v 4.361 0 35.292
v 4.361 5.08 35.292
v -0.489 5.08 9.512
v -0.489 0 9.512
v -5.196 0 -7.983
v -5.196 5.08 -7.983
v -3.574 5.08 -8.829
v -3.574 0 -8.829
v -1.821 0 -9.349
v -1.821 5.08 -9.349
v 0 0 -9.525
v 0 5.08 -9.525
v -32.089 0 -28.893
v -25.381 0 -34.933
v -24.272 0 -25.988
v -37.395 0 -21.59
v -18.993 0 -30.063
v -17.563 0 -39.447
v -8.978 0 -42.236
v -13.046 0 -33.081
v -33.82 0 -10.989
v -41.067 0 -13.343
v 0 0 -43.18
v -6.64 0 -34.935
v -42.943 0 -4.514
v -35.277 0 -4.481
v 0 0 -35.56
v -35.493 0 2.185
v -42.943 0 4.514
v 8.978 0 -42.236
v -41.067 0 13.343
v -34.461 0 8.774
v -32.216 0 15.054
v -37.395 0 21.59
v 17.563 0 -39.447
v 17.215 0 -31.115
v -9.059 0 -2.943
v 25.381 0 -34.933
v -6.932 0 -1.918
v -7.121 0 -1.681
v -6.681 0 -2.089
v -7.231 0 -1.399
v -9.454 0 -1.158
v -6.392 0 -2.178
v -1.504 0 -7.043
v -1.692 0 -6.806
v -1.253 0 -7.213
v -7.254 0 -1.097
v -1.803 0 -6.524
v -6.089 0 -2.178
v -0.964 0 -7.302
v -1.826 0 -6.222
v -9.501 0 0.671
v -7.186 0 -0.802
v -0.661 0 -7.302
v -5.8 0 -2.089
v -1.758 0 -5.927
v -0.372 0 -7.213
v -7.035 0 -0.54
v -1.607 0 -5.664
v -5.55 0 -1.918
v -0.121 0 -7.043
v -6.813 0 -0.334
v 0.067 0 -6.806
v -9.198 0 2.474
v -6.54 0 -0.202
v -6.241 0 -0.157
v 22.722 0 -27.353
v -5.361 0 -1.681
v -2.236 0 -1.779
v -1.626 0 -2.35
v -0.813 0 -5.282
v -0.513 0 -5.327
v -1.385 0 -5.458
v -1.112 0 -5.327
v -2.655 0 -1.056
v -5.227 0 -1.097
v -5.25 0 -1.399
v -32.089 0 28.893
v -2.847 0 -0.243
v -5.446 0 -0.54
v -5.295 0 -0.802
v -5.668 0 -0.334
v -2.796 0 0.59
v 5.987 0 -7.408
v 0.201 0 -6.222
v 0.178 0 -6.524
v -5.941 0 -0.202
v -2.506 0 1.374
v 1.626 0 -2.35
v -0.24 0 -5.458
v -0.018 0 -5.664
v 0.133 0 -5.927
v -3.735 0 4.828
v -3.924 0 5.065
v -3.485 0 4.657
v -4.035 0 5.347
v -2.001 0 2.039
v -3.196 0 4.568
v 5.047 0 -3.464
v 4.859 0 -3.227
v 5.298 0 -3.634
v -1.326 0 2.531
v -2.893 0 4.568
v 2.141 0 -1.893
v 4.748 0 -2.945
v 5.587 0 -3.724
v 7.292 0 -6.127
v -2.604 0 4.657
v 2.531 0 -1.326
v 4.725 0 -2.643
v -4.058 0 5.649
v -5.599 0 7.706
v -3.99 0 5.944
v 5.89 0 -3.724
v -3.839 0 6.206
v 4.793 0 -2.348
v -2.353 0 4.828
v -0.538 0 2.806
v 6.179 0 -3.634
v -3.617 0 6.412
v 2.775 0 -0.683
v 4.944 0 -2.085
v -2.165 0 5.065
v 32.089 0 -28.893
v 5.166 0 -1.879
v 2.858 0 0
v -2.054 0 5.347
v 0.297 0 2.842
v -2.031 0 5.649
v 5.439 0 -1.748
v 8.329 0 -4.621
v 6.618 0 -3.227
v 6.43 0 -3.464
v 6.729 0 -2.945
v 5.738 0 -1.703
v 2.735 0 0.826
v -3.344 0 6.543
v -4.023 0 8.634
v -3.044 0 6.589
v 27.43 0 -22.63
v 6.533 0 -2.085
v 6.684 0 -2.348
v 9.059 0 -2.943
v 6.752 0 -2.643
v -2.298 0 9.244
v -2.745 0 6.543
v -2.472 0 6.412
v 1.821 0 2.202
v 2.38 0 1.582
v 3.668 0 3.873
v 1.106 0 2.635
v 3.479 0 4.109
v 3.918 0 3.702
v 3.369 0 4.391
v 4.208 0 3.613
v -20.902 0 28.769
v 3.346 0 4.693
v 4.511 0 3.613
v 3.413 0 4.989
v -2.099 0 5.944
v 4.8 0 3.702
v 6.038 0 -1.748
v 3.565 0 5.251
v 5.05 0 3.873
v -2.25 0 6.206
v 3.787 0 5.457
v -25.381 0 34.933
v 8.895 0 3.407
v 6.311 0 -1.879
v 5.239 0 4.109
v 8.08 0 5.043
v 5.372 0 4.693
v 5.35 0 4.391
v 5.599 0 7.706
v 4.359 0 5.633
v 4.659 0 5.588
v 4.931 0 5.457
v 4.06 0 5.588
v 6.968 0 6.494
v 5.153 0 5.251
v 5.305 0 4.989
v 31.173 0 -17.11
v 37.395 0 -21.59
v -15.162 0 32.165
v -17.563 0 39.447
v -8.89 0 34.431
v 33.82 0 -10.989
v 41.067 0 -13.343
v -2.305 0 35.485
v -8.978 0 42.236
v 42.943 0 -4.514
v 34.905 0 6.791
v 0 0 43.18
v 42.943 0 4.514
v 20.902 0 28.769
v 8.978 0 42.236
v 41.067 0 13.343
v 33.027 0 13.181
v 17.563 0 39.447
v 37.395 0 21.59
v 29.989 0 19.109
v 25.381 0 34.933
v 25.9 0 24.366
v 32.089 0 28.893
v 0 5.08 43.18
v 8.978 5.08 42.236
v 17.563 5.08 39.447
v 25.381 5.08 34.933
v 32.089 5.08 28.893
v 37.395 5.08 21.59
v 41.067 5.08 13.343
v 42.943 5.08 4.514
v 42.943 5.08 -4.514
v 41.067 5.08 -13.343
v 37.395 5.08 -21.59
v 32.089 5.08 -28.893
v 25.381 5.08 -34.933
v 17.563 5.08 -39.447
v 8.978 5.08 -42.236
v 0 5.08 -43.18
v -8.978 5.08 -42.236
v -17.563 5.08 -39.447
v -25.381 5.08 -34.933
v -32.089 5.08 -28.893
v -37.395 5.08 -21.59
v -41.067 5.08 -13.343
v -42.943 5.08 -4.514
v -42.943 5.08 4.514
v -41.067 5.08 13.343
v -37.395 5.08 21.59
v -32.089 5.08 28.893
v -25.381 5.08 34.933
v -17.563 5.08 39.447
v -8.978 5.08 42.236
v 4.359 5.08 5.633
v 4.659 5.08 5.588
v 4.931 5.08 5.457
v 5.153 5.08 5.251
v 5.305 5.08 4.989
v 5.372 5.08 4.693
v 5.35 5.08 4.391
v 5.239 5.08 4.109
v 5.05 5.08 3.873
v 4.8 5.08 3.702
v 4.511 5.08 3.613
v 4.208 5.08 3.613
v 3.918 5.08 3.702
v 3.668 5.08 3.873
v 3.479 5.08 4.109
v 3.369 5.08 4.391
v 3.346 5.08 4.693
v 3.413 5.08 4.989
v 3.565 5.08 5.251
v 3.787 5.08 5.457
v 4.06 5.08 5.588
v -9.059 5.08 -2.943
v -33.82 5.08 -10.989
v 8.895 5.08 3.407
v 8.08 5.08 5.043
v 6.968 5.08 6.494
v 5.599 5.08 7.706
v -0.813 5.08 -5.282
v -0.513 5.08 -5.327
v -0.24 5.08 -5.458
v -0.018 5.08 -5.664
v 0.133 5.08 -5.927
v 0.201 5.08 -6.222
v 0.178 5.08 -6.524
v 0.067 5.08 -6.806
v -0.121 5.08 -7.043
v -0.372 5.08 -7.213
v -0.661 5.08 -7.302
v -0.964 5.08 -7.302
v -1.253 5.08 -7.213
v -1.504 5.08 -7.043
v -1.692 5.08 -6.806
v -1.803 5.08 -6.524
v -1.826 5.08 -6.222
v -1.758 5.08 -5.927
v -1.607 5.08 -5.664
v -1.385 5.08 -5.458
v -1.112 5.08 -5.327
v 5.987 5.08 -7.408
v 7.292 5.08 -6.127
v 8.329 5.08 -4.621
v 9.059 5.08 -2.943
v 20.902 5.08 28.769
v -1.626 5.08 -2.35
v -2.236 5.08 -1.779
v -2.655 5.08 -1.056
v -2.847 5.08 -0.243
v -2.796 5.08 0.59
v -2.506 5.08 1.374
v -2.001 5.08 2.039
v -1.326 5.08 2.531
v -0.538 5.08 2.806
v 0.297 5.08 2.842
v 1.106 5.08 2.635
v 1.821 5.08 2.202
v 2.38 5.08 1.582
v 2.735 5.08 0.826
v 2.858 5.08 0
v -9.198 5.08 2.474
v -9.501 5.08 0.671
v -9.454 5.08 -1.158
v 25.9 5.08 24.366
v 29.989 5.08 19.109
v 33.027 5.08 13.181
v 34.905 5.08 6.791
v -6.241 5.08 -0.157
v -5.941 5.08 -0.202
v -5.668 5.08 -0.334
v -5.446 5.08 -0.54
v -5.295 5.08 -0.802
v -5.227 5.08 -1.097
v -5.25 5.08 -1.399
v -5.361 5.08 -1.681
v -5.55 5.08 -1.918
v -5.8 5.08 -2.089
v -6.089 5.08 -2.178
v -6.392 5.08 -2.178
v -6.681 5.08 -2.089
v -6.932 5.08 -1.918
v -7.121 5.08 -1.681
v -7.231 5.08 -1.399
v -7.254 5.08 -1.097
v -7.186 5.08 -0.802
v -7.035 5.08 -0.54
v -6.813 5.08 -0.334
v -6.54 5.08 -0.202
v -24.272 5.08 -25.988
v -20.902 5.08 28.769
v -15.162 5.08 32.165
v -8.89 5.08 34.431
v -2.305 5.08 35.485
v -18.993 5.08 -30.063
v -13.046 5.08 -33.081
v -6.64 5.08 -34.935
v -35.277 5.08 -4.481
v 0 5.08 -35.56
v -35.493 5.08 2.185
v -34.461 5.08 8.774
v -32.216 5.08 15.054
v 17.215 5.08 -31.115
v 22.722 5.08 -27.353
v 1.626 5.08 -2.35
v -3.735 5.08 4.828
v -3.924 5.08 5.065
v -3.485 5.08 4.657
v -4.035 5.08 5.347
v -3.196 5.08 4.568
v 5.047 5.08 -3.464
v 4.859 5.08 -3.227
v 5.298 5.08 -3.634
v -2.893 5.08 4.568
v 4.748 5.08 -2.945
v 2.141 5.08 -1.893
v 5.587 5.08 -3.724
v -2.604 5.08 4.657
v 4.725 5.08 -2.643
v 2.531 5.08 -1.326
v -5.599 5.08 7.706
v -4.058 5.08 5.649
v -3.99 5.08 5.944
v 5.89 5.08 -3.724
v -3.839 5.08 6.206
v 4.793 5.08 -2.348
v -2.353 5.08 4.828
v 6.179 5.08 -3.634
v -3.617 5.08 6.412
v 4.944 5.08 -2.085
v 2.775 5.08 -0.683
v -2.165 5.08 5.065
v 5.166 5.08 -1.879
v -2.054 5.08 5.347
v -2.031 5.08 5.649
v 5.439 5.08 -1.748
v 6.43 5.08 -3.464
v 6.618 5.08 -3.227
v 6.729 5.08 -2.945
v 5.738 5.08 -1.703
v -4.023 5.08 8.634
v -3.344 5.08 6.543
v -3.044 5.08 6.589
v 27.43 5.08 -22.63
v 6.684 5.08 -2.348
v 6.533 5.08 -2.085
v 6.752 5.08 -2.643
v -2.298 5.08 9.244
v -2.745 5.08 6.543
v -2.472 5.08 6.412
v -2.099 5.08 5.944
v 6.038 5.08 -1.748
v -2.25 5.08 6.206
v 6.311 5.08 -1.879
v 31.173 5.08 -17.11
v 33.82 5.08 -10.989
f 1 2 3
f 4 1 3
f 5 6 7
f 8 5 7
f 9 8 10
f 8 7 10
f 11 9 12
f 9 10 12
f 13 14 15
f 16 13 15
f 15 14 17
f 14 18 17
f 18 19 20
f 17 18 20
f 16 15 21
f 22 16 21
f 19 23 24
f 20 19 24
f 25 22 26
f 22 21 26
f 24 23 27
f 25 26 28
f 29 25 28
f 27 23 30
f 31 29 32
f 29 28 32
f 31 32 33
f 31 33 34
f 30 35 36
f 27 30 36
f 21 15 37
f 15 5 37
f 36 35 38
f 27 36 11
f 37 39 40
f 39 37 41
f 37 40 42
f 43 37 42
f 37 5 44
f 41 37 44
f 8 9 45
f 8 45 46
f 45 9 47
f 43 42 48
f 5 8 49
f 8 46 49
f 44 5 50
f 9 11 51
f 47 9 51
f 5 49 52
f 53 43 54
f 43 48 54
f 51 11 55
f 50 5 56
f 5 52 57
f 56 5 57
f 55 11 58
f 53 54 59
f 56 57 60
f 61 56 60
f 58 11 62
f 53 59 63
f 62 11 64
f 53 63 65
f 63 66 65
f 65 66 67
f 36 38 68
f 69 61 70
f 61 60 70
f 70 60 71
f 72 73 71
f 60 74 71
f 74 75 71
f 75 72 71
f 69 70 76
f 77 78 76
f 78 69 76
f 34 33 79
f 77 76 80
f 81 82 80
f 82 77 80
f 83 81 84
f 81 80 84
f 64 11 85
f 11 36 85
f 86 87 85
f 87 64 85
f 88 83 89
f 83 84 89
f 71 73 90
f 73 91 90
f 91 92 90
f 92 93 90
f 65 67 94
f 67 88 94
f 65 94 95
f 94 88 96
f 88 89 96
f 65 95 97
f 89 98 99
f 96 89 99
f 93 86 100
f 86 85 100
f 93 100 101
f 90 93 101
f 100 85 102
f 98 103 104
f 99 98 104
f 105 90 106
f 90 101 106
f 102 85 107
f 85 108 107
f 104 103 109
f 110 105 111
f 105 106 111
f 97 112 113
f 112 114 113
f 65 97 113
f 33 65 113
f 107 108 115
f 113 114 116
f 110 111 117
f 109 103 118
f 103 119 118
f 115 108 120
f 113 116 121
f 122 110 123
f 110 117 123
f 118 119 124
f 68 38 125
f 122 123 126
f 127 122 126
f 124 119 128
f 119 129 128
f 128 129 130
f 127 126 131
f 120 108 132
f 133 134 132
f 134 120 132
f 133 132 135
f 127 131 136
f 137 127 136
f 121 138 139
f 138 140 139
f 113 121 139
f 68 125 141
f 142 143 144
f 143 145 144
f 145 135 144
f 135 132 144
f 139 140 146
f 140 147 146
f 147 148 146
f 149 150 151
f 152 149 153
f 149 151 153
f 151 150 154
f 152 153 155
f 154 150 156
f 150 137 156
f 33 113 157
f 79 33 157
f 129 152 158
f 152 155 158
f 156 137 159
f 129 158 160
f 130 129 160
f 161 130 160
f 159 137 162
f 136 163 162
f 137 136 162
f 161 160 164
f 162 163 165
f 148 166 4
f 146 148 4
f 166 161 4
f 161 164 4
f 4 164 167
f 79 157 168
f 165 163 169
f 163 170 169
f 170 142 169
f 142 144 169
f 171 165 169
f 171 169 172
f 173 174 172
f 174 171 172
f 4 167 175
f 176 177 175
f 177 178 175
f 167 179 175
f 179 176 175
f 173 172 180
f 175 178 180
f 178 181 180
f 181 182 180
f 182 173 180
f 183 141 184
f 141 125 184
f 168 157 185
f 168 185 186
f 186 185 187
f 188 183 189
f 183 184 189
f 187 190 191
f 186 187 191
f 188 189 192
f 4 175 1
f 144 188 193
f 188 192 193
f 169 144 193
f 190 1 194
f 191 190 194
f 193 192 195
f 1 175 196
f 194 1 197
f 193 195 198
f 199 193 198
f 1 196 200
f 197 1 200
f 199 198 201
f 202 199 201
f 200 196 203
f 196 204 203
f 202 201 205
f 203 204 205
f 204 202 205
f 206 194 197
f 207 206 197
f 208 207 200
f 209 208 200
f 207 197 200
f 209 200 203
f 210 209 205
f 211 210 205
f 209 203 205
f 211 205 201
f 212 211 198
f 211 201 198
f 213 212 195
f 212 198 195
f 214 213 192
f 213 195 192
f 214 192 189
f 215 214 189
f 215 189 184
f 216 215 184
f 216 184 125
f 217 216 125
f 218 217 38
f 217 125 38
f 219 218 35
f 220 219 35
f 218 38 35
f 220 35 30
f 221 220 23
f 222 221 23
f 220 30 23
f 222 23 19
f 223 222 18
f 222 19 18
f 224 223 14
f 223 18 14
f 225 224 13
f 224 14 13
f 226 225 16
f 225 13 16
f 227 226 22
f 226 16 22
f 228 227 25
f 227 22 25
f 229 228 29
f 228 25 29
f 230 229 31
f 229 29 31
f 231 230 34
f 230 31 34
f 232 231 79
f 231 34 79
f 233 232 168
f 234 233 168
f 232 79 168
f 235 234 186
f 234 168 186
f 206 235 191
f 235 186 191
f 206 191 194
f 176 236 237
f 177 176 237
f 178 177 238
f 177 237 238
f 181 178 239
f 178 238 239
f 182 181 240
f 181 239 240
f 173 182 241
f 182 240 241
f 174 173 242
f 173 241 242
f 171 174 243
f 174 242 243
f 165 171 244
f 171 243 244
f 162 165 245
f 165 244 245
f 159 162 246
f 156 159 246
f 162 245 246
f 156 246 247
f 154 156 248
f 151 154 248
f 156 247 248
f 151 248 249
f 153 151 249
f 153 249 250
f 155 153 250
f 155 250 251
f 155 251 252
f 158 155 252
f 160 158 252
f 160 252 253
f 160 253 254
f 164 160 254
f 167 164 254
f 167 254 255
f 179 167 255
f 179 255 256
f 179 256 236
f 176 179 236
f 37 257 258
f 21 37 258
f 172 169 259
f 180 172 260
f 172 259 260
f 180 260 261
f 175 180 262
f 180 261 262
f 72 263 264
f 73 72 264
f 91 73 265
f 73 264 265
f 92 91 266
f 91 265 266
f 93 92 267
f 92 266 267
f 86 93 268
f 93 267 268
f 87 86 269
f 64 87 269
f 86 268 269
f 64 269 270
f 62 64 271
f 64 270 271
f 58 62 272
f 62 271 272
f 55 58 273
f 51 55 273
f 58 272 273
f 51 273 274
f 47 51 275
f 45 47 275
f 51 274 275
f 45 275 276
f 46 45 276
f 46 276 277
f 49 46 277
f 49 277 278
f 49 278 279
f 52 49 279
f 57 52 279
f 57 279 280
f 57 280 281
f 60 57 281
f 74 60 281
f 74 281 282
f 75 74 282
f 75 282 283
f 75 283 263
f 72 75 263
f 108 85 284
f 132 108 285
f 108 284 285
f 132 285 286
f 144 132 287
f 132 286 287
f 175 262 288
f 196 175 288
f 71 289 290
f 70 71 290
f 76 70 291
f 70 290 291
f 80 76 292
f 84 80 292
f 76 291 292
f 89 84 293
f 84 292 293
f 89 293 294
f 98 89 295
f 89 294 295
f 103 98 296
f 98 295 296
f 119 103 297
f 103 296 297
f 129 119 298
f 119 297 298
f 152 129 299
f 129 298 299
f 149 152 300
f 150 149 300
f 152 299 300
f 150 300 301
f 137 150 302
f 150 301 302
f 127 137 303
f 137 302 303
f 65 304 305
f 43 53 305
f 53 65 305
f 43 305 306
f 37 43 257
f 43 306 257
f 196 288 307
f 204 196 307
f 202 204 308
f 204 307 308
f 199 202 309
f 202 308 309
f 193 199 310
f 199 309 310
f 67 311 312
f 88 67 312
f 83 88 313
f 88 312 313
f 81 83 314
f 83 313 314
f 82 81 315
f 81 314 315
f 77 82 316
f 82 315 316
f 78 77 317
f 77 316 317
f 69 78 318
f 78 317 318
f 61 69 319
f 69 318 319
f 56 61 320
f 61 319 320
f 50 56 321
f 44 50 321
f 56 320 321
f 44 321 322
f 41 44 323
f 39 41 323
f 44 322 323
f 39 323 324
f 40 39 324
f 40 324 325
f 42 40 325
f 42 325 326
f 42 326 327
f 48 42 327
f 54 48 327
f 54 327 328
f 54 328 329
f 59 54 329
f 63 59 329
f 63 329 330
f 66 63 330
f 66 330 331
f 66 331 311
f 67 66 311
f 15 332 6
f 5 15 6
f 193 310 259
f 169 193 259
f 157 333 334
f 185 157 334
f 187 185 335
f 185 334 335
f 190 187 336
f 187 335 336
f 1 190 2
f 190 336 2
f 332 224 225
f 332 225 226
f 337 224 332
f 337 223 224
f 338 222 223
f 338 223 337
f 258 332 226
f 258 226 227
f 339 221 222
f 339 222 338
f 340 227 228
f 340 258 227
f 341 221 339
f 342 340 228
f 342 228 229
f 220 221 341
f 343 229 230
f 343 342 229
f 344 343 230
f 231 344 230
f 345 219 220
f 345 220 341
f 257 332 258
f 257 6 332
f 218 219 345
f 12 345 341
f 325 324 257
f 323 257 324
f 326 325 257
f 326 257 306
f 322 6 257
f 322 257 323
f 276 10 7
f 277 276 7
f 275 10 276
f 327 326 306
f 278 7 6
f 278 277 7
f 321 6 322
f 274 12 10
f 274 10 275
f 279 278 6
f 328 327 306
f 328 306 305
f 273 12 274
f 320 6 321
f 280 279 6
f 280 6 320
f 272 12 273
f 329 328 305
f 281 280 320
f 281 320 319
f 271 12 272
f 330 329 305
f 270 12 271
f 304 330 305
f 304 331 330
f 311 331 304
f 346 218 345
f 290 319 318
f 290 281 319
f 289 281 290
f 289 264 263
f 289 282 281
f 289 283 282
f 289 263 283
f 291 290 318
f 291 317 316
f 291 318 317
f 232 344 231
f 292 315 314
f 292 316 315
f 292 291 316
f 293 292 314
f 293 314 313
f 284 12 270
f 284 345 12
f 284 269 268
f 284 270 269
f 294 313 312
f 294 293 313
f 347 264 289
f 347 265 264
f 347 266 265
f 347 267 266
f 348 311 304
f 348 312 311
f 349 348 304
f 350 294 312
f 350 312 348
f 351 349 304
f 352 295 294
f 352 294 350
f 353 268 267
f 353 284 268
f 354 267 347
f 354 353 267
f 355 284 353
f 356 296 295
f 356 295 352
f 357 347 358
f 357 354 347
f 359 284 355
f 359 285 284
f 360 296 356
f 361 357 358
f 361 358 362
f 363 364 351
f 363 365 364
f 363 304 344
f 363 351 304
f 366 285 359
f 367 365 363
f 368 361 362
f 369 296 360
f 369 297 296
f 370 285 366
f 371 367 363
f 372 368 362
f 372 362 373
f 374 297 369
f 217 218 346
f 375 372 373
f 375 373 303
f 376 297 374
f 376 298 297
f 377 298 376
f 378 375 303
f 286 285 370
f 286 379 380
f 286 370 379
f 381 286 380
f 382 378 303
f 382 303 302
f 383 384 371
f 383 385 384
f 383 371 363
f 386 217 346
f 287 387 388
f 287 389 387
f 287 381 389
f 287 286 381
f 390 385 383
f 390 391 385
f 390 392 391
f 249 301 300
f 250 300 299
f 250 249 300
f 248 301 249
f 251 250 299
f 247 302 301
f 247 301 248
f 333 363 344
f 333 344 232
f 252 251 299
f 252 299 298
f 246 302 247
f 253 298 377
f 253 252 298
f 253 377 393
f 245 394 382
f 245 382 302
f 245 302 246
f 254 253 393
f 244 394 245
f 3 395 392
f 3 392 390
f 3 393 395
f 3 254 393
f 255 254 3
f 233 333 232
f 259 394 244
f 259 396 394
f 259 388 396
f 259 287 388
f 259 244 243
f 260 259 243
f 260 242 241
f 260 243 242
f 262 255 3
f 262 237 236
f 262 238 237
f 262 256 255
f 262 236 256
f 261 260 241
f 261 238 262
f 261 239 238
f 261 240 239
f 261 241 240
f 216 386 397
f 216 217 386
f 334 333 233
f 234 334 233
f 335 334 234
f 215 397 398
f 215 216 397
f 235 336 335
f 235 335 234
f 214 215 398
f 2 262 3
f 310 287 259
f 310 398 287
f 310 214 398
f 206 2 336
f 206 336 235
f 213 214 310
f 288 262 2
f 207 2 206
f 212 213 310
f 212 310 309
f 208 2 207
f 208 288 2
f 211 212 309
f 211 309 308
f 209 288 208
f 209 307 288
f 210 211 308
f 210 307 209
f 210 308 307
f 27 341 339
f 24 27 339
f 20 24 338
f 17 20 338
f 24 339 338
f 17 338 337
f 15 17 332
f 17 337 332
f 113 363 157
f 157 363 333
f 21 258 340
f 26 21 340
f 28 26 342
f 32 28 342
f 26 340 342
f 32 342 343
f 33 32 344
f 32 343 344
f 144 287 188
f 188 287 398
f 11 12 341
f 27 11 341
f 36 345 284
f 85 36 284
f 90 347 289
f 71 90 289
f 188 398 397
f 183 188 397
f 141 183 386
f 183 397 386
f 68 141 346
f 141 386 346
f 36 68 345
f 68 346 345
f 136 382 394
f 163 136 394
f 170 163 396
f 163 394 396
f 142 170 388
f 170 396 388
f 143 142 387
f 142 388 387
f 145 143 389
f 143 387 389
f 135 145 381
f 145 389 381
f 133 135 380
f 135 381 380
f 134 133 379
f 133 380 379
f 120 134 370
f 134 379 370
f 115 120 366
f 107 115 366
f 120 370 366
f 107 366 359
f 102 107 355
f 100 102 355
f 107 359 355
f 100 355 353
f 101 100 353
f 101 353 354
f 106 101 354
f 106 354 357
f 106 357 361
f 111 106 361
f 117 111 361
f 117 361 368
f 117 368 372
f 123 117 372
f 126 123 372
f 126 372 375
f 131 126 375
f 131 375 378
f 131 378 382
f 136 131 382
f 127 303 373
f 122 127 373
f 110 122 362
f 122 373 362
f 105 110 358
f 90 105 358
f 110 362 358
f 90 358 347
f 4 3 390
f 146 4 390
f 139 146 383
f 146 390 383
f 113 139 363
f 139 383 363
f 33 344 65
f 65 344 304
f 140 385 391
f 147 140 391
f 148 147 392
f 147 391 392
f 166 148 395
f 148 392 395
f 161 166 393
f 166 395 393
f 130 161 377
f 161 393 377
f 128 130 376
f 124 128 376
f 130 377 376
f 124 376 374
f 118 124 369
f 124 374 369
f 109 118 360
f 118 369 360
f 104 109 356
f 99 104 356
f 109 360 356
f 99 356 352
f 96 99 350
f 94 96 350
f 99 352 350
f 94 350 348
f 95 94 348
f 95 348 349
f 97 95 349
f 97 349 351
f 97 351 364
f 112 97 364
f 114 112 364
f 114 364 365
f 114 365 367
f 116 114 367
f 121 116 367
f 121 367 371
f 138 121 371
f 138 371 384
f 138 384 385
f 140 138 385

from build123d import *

# Parameters (mm, degrees)
SKETCH2_R           = 43.18
BOSS_EXTRUDE1_DEPTH = 5.08
CUT_EXTRUDE1_DEPTH  = 62.276677456
CUT_EXTRUDE2_DEPTH  = 62.276677456
SKETCH6_R           = 1.016
CUT_EXTRUDE3_DEPTH  = 62.276677456


with BuildPart() as part:
    # Sketch2 → Boss-Extrude1 (new body)
    with BuildSketch(Plane(origin=(0, 0, 0), x_dir=(1, 0, 0), z_dir=(0, 1, 0))):
        with Locations(Location((0, 0, 0), (0, 0, 270))):
            Circle(SKETCH2_R)
    extrude(amount=BOSS_EXTRUDE1_DEPTH)

    # Sketch3 → Cut-Extrude1 (cut, through all)
    with BuildSketch(Plane(origin=(0, 5.08, 0), x_dir=(1, 0, 0), z_dir=(0, 1, 0))):
        with BuildLine():
            Line((1.626393556, 2.3495), (-1.626393556, 2.3495))
            ThreePointArc((-1.626393556, 2.3495), (-1.326251609, -2.531079398), (2.8575, 0))
            ThreePointArc((2.8575, 0), (2.531079398, 1.326251609), (1.626393556, 2.3495))
        make_face()
    extrude(amount=-CUT_EXTRUDE1_DEPTH, mode=Mode.SUBTRACT)

    # Sketch5 → Cut-Extrude2 (cut, through all)
    with BuildSketch(Plane(origin=(0, 5.08, 0), x_dir=(1, 0, 0), z_dir=(0, 1, 0))):
        with BuildLine():
            Line((-9.058813318, 2.943386871), (-33.819569719, 10.98864432))
            ThreePointArc((-33.819569719, 10.98864432), (-35.492818655, -2.184816682), (-32.216498168, -15.053599097))
            Line((-32.216498168, -15.053599097), (-9.197962288, -2.474492827))
            ThreePointArc((-9.197962288, -2.474492827), (-9.521860059, 0.244552684), (-9.058813318, 2.943386871))
        make_face()
        with BuildLine():
            Line((-5.598654528, -7.705886871), (-20.901643572, -28.76864432))
            ThreePointArc((-20.901643572, -28.76864432), (-8.89, -34.430821948), (4.361378082, -35.291528463))
            Line((4.361378082, -35.291528463), (-0.488944133, -9.512442307))
            ThreePointArc((-0.488944133, -9.512442307), (-3.175, -8.980256121), (-5.598654528, -7.705886871))
        make_face()
        with BuildLine():
            Line((5.598654528, -7.705886871), (20.901643572, -28.76864432))
            ThreePointArc((20.901643572, -28.76864432), (29.9893062, -19.109032253), (34.905459287, -6.79135568))
            Line((34.905459287, -6.79135568), (8.894976784, -3.406613129))
            ThreePointArc((8.894976784, -3.406613129), (7.558920282, -5.795545631), (5.598654528, -7.705886871))
        make_face()
        with BuildLine():
            ThreePointArc((33.819569719, 10.98864432), (27.430090445, 22.629709193), (17.215410974, 31.115))
            Line((17.215410974, 31.115), (5.986837414, 7.408333333))
            ThreePointArc((5.986837414, 7.408333333), (7.847091067, 5.39896164), (9.058813318, 2.943386871))
            Line((9.058813318, 2.943386871), (33.819569719, 10.98864432))
        make_face()
        with BuildLine():
            ThreePointArc((0, 35.56), (-13.045768285, 33.080530979), (-24.272268948, 25.987892567))
            Line((-24.272268948, 25.987892567), (-5.195709188, 7.983121635))
            ThreePointArc((-5.195709188, 7.983121635), (-2.709833153, 9.131397992), (0, 9.525))
            Line((0, 9.525), (0, 35.56))
        make_face()
    extrude(amount=-CUT_EXTRUDE2_DEPTH, mode=Mode.SUBTRACT)

    # Sketch6 → Cut-Extrude3 (cut, through all)
    with BuildSketch(Plane(origin=(0, 5.08, 0), x_dir=(1, 0, 0), z_dir=(0, 1, 0))):
        with Locations(Location((5.738468444, 2.718911532, 0), (0, 0, 270))):
            Circle(SKETCH6_R)
        with Locations(Location((4.3591228, -4.617417938, 0), (0, 0, 270))):
            Circle(SKETCH6_R)
        with Locations(Location((-6.240654593, 1.173341487, 0), (0, 0, 270))):
            Circle(SKETCH6_R)
        with Locations(Location((-0.812554258, 6.297797677, 0), (0, 0, 270))):
            Circle(SKETCH6_R)
        with Locations(Location((-3.044382392, -5.572632757, 0), (0, 0, 270))):
            Circle(SKETCH6_R)
    extrude(amount=-CUT_EXTRUDE3_DEPTH, mode=Mode.SUBTRACT)


solid = part.part
